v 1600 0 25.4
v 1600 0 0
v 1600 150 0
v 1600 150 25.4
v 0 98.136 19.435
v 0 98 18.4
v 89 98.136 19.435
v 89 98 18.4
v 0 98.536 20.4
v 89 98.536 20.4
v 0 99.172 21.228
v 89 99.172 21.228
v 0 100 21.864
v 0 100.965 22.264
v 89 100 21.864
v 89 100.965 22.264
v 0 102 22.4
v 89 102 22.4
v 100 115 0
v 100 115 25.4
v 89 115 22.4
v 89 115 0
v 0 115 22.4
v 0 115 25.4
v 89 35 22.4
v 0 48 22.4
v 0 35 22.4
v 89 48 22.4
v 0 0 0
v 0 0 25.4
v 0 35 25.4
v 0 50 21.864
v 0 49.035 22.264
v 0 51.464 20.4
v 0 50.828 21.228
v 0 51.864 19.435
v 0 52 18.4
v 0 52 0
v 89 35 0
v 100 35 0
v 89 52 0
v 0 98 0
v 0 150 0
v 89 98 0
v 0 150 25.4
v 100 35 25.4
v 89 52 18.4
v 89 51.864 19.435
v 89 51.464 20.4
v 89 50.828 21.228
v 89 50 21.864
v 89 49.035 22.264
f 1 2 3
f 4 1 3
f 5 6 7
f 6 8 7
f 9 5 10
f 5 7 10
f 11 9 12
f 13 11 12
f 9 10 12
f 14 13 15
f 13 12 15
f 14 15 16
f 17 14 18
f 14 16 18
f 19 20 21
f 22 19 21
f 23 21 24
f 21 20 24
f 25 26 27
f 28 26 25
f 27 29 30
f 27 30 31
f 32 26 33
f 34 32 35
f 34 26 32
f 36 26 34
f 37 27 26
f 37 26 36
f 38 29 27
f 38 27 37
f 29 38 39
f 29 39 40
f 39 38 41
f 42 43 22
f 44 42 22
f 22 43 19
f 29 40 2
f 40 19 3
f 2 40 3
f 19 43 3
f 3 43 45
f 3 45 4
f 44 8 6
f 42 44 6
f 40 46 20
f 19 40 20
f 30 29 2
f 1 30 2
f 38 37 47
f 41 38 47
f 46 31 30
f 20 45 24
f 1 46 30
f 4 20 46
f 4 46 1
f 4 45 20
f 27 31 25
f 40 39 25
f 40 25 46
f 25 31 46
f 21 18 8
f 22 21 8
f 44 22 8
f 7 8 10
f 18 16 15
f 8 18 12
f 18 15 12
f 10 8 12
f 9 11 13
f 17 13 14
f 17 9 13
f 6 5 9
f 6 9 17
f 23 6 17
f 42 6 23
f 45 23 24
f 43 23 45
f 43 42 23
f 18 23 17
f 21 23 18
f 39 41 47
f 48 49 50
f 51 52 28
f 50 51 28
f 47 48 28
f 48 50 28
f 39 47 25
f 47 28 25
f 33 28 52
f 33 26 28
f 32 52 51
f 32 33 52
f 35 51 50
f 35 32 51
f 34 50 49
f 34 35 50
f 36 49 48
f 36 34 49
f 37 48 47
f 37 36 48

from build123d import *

# Parameters (mm, degrees)
SKETCH1_W           = 1600
SKETCH1_H           = 150
BOSS_EXTRUDE1_DEPTH = 25.4
CUT_EXTRUDE1_DEPTH  = 1608.216587769
SKETCH3_W           = 100
SKETCH3_H           = 80
CUT_EXTRUDE2_DEPTH  = 3
FILLET1_R           = 4


with BuildPart() as part:
    # Sketch1 → Boss-Extrude1 (new body)
    with BuildSketch(Plane.XY):
        with Locations((800, 75)):
            Rectangle(SKETCH1_W, SKETCH1_H)
    extrude(amount=BOSS_EXTRUDE1_DEPTH)

    # Sketch2 → Cut-Extrude1 (cut, through all)
    with BuildSketch(Plane.XY.offset(25.4)):
        Polygon((0, 52), (89, 52), (89, 35), (100, 35), (100, 115), (89, 115), (89, 98), (0, 98), align=None)
    extrude(amount=-CUT_EXTRUDE1_DEPTH, mode=Mode.SUBTRACT)

    # Sketch3 → Cut-Extrude2 (cut)
    with BuildSketch(Plane.XY.offset(25.4)):
        with Locations((50, 75)):
            Rectangle(SKETCH3_W, SKETCH3_H)
    extrude(amount=-CUT_EXTRUDE2_DEPTH, mode=Mode.SUBTRACT)

    # Fillet1
    fillet1_edges = [part.edges().sort_by_distance(p)[0] for p in [
        (44.5, 52, 22.4),
        (44.5, 98, 22.4),
    ]]
    fillet(fillet1_edges, radius=FILLET1_R)


solid = part.part
